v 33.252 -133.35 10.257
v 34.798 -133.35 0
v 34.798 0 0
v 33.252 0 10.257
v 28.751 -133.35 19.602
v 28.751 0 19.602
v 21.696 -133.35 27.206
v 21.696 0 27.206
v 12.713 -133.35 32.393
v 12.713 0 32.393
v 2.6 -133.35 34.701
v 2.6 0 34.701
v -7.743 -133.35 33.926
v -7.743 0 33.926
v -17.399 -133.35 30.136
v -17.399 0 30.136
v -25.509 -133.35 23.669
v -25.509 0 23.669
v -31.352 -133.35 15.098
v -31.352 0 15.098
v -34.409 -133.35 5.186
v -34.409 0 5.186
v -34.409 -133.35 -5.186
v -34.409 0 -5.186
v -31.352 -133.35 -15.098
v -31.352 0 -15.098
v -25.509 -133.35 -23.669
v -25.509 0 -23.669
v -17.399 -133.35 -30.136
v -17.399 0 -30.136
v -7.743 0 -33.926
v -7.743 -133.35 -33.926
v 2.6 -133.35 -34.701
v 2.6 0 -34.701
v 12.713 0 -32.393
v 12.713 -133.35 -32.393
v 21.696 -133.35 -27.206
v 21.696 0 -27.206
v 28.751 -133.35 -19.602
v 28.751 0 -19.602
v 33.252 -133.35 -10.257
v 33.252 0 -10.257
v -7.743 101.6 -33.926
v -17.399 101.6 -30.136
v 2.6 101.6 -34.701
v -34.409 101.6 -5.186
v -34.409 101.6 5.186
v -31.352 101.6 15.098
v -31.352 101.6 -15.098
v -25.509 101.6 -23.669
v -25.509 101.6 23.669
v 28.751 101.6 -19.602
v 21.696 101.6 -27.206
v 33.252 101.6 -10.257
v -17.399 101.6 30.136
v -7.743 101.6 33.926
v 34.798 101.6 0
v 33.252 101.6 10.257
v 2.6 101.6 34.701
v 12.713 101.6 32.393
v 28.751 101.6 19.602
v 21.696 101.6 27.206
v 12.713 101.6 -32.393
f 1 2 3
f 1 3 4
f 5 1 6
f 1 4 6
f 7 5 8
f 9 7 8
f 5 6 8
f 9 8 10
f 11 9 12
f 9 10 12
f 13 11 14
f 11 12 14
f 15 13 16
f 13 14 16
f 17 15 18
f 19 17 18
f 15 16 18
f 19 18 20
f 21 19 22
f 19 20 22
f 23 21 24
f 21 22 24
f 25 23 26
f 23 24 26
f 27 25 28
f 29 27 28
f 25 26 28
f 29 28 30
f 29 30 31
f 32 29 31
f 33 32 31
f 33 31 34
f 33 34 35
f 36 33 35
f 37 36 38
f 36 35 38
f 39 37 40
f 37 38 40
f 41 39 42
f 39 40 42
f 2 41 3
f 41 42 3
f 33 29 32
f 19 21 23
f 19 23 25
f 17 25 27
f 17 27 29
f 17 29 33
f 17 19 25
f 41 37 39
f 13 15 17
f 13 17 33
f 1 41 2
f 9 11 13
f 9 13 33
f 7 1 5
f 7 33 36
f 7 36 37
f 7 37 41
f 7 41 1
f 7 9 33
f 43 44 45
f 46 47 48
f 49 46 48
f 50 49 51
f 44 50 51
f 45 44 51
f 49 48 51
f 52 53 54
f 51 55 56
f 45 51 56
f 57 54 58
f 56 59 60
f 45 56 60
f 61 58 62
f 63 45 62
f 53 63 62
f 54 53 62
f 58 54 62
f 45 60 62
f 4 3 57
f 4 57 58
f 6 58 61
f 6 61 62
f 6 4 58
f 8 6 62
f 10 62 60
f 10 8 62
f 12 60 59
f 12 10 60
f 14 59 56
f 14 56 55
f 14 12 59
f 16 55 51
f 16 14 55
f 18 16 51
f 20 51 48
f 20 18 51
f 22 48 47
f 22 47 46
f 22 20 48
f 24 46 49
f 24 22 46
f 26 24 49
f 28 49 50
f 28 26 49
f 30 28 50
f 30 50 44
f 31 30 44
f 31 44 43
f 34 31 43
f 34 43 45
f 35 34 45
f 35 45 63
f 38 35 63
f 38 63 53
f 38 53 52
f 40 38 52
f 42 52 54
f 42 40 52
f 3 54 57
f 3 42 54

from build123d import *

# Parameters (mm, degrees)
F0_R     = 34.798
F1_DEPTH = 6.35
F2_DEPTH = 25.4
F3_DEPTH = 101.6
F4_DEPTH = 101.6


with BuildPart() as f1:
    # F0 (on Front) → F1 (new body)
    with BuildSketch(Plane.XZ):
        Circle(F0_R)
    extrude(amount=F1_DEPTH)

    # F2 (add): a face of the model
    f2_faces = [f1.faces().sort_by_distance(p)[0] for p in [
        (0, -6.35, 0),
    ]]
    extrude(f2_faces, amount=F2_DEPTH)

    # F3 (add): a face of the model
    f3_faces = [f1.faces().sort_by_distance(p)[0] for p in [
        (0, -31.75, 0),
    ]]
    extrude(f3_faces, amount=F3_DEPTH)

    # F4 (add): a face of the model
    f4_faces = [f1.faces().sort_by_distance(p)[0] for p in [
        (0, 0, 0),
    ]]
    extrude(f4_faces, amount=F4_DEPTH)


solid = f1.part
